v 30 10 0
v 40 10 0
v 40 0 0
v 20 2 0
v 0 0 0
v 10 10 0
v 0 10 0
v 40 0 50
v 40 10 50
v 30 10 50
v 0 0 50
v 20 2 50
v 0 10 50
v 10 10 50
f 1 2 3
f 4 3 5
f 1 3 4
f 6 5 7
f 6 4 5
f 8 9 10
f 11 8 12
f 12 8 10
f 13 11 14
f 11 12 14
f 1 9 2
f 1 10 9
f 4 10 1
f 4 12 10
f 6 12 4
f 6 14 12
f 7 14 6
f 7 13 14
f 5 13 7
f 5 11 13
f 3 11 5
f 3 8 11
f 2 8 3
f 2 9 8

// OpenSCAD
$fn = 32;

// ----------------------------------------------------------------------
// V guide rail: vway, 40 mm wide
// ----------------------------------------------------------------------

// --- parameters (mm) ---
rail_w = 40;              // rail width, X
base_t = 10;              // base plate thickness
v_depth = 8;              // V feature depth / height
v_half_w = 10;            // half width of the V at the base face
plate_t = 50;             // rail length, Z (the extrusion height)
fit_tol = 0.1;            // declared fit tolerance (prompt contract)
free_tol = 0.3;           // declared free tolerance (prompt contract)

profile = [[0, 0], [40, 0], [40, 10], [30, 10], [20, 2], [10, 10], [0, 10]];  // primary outline, 7 points, counter clockwise

// --- the one profile operation ---
linear_extrude(height = plate_t) polygon(points = profile);
